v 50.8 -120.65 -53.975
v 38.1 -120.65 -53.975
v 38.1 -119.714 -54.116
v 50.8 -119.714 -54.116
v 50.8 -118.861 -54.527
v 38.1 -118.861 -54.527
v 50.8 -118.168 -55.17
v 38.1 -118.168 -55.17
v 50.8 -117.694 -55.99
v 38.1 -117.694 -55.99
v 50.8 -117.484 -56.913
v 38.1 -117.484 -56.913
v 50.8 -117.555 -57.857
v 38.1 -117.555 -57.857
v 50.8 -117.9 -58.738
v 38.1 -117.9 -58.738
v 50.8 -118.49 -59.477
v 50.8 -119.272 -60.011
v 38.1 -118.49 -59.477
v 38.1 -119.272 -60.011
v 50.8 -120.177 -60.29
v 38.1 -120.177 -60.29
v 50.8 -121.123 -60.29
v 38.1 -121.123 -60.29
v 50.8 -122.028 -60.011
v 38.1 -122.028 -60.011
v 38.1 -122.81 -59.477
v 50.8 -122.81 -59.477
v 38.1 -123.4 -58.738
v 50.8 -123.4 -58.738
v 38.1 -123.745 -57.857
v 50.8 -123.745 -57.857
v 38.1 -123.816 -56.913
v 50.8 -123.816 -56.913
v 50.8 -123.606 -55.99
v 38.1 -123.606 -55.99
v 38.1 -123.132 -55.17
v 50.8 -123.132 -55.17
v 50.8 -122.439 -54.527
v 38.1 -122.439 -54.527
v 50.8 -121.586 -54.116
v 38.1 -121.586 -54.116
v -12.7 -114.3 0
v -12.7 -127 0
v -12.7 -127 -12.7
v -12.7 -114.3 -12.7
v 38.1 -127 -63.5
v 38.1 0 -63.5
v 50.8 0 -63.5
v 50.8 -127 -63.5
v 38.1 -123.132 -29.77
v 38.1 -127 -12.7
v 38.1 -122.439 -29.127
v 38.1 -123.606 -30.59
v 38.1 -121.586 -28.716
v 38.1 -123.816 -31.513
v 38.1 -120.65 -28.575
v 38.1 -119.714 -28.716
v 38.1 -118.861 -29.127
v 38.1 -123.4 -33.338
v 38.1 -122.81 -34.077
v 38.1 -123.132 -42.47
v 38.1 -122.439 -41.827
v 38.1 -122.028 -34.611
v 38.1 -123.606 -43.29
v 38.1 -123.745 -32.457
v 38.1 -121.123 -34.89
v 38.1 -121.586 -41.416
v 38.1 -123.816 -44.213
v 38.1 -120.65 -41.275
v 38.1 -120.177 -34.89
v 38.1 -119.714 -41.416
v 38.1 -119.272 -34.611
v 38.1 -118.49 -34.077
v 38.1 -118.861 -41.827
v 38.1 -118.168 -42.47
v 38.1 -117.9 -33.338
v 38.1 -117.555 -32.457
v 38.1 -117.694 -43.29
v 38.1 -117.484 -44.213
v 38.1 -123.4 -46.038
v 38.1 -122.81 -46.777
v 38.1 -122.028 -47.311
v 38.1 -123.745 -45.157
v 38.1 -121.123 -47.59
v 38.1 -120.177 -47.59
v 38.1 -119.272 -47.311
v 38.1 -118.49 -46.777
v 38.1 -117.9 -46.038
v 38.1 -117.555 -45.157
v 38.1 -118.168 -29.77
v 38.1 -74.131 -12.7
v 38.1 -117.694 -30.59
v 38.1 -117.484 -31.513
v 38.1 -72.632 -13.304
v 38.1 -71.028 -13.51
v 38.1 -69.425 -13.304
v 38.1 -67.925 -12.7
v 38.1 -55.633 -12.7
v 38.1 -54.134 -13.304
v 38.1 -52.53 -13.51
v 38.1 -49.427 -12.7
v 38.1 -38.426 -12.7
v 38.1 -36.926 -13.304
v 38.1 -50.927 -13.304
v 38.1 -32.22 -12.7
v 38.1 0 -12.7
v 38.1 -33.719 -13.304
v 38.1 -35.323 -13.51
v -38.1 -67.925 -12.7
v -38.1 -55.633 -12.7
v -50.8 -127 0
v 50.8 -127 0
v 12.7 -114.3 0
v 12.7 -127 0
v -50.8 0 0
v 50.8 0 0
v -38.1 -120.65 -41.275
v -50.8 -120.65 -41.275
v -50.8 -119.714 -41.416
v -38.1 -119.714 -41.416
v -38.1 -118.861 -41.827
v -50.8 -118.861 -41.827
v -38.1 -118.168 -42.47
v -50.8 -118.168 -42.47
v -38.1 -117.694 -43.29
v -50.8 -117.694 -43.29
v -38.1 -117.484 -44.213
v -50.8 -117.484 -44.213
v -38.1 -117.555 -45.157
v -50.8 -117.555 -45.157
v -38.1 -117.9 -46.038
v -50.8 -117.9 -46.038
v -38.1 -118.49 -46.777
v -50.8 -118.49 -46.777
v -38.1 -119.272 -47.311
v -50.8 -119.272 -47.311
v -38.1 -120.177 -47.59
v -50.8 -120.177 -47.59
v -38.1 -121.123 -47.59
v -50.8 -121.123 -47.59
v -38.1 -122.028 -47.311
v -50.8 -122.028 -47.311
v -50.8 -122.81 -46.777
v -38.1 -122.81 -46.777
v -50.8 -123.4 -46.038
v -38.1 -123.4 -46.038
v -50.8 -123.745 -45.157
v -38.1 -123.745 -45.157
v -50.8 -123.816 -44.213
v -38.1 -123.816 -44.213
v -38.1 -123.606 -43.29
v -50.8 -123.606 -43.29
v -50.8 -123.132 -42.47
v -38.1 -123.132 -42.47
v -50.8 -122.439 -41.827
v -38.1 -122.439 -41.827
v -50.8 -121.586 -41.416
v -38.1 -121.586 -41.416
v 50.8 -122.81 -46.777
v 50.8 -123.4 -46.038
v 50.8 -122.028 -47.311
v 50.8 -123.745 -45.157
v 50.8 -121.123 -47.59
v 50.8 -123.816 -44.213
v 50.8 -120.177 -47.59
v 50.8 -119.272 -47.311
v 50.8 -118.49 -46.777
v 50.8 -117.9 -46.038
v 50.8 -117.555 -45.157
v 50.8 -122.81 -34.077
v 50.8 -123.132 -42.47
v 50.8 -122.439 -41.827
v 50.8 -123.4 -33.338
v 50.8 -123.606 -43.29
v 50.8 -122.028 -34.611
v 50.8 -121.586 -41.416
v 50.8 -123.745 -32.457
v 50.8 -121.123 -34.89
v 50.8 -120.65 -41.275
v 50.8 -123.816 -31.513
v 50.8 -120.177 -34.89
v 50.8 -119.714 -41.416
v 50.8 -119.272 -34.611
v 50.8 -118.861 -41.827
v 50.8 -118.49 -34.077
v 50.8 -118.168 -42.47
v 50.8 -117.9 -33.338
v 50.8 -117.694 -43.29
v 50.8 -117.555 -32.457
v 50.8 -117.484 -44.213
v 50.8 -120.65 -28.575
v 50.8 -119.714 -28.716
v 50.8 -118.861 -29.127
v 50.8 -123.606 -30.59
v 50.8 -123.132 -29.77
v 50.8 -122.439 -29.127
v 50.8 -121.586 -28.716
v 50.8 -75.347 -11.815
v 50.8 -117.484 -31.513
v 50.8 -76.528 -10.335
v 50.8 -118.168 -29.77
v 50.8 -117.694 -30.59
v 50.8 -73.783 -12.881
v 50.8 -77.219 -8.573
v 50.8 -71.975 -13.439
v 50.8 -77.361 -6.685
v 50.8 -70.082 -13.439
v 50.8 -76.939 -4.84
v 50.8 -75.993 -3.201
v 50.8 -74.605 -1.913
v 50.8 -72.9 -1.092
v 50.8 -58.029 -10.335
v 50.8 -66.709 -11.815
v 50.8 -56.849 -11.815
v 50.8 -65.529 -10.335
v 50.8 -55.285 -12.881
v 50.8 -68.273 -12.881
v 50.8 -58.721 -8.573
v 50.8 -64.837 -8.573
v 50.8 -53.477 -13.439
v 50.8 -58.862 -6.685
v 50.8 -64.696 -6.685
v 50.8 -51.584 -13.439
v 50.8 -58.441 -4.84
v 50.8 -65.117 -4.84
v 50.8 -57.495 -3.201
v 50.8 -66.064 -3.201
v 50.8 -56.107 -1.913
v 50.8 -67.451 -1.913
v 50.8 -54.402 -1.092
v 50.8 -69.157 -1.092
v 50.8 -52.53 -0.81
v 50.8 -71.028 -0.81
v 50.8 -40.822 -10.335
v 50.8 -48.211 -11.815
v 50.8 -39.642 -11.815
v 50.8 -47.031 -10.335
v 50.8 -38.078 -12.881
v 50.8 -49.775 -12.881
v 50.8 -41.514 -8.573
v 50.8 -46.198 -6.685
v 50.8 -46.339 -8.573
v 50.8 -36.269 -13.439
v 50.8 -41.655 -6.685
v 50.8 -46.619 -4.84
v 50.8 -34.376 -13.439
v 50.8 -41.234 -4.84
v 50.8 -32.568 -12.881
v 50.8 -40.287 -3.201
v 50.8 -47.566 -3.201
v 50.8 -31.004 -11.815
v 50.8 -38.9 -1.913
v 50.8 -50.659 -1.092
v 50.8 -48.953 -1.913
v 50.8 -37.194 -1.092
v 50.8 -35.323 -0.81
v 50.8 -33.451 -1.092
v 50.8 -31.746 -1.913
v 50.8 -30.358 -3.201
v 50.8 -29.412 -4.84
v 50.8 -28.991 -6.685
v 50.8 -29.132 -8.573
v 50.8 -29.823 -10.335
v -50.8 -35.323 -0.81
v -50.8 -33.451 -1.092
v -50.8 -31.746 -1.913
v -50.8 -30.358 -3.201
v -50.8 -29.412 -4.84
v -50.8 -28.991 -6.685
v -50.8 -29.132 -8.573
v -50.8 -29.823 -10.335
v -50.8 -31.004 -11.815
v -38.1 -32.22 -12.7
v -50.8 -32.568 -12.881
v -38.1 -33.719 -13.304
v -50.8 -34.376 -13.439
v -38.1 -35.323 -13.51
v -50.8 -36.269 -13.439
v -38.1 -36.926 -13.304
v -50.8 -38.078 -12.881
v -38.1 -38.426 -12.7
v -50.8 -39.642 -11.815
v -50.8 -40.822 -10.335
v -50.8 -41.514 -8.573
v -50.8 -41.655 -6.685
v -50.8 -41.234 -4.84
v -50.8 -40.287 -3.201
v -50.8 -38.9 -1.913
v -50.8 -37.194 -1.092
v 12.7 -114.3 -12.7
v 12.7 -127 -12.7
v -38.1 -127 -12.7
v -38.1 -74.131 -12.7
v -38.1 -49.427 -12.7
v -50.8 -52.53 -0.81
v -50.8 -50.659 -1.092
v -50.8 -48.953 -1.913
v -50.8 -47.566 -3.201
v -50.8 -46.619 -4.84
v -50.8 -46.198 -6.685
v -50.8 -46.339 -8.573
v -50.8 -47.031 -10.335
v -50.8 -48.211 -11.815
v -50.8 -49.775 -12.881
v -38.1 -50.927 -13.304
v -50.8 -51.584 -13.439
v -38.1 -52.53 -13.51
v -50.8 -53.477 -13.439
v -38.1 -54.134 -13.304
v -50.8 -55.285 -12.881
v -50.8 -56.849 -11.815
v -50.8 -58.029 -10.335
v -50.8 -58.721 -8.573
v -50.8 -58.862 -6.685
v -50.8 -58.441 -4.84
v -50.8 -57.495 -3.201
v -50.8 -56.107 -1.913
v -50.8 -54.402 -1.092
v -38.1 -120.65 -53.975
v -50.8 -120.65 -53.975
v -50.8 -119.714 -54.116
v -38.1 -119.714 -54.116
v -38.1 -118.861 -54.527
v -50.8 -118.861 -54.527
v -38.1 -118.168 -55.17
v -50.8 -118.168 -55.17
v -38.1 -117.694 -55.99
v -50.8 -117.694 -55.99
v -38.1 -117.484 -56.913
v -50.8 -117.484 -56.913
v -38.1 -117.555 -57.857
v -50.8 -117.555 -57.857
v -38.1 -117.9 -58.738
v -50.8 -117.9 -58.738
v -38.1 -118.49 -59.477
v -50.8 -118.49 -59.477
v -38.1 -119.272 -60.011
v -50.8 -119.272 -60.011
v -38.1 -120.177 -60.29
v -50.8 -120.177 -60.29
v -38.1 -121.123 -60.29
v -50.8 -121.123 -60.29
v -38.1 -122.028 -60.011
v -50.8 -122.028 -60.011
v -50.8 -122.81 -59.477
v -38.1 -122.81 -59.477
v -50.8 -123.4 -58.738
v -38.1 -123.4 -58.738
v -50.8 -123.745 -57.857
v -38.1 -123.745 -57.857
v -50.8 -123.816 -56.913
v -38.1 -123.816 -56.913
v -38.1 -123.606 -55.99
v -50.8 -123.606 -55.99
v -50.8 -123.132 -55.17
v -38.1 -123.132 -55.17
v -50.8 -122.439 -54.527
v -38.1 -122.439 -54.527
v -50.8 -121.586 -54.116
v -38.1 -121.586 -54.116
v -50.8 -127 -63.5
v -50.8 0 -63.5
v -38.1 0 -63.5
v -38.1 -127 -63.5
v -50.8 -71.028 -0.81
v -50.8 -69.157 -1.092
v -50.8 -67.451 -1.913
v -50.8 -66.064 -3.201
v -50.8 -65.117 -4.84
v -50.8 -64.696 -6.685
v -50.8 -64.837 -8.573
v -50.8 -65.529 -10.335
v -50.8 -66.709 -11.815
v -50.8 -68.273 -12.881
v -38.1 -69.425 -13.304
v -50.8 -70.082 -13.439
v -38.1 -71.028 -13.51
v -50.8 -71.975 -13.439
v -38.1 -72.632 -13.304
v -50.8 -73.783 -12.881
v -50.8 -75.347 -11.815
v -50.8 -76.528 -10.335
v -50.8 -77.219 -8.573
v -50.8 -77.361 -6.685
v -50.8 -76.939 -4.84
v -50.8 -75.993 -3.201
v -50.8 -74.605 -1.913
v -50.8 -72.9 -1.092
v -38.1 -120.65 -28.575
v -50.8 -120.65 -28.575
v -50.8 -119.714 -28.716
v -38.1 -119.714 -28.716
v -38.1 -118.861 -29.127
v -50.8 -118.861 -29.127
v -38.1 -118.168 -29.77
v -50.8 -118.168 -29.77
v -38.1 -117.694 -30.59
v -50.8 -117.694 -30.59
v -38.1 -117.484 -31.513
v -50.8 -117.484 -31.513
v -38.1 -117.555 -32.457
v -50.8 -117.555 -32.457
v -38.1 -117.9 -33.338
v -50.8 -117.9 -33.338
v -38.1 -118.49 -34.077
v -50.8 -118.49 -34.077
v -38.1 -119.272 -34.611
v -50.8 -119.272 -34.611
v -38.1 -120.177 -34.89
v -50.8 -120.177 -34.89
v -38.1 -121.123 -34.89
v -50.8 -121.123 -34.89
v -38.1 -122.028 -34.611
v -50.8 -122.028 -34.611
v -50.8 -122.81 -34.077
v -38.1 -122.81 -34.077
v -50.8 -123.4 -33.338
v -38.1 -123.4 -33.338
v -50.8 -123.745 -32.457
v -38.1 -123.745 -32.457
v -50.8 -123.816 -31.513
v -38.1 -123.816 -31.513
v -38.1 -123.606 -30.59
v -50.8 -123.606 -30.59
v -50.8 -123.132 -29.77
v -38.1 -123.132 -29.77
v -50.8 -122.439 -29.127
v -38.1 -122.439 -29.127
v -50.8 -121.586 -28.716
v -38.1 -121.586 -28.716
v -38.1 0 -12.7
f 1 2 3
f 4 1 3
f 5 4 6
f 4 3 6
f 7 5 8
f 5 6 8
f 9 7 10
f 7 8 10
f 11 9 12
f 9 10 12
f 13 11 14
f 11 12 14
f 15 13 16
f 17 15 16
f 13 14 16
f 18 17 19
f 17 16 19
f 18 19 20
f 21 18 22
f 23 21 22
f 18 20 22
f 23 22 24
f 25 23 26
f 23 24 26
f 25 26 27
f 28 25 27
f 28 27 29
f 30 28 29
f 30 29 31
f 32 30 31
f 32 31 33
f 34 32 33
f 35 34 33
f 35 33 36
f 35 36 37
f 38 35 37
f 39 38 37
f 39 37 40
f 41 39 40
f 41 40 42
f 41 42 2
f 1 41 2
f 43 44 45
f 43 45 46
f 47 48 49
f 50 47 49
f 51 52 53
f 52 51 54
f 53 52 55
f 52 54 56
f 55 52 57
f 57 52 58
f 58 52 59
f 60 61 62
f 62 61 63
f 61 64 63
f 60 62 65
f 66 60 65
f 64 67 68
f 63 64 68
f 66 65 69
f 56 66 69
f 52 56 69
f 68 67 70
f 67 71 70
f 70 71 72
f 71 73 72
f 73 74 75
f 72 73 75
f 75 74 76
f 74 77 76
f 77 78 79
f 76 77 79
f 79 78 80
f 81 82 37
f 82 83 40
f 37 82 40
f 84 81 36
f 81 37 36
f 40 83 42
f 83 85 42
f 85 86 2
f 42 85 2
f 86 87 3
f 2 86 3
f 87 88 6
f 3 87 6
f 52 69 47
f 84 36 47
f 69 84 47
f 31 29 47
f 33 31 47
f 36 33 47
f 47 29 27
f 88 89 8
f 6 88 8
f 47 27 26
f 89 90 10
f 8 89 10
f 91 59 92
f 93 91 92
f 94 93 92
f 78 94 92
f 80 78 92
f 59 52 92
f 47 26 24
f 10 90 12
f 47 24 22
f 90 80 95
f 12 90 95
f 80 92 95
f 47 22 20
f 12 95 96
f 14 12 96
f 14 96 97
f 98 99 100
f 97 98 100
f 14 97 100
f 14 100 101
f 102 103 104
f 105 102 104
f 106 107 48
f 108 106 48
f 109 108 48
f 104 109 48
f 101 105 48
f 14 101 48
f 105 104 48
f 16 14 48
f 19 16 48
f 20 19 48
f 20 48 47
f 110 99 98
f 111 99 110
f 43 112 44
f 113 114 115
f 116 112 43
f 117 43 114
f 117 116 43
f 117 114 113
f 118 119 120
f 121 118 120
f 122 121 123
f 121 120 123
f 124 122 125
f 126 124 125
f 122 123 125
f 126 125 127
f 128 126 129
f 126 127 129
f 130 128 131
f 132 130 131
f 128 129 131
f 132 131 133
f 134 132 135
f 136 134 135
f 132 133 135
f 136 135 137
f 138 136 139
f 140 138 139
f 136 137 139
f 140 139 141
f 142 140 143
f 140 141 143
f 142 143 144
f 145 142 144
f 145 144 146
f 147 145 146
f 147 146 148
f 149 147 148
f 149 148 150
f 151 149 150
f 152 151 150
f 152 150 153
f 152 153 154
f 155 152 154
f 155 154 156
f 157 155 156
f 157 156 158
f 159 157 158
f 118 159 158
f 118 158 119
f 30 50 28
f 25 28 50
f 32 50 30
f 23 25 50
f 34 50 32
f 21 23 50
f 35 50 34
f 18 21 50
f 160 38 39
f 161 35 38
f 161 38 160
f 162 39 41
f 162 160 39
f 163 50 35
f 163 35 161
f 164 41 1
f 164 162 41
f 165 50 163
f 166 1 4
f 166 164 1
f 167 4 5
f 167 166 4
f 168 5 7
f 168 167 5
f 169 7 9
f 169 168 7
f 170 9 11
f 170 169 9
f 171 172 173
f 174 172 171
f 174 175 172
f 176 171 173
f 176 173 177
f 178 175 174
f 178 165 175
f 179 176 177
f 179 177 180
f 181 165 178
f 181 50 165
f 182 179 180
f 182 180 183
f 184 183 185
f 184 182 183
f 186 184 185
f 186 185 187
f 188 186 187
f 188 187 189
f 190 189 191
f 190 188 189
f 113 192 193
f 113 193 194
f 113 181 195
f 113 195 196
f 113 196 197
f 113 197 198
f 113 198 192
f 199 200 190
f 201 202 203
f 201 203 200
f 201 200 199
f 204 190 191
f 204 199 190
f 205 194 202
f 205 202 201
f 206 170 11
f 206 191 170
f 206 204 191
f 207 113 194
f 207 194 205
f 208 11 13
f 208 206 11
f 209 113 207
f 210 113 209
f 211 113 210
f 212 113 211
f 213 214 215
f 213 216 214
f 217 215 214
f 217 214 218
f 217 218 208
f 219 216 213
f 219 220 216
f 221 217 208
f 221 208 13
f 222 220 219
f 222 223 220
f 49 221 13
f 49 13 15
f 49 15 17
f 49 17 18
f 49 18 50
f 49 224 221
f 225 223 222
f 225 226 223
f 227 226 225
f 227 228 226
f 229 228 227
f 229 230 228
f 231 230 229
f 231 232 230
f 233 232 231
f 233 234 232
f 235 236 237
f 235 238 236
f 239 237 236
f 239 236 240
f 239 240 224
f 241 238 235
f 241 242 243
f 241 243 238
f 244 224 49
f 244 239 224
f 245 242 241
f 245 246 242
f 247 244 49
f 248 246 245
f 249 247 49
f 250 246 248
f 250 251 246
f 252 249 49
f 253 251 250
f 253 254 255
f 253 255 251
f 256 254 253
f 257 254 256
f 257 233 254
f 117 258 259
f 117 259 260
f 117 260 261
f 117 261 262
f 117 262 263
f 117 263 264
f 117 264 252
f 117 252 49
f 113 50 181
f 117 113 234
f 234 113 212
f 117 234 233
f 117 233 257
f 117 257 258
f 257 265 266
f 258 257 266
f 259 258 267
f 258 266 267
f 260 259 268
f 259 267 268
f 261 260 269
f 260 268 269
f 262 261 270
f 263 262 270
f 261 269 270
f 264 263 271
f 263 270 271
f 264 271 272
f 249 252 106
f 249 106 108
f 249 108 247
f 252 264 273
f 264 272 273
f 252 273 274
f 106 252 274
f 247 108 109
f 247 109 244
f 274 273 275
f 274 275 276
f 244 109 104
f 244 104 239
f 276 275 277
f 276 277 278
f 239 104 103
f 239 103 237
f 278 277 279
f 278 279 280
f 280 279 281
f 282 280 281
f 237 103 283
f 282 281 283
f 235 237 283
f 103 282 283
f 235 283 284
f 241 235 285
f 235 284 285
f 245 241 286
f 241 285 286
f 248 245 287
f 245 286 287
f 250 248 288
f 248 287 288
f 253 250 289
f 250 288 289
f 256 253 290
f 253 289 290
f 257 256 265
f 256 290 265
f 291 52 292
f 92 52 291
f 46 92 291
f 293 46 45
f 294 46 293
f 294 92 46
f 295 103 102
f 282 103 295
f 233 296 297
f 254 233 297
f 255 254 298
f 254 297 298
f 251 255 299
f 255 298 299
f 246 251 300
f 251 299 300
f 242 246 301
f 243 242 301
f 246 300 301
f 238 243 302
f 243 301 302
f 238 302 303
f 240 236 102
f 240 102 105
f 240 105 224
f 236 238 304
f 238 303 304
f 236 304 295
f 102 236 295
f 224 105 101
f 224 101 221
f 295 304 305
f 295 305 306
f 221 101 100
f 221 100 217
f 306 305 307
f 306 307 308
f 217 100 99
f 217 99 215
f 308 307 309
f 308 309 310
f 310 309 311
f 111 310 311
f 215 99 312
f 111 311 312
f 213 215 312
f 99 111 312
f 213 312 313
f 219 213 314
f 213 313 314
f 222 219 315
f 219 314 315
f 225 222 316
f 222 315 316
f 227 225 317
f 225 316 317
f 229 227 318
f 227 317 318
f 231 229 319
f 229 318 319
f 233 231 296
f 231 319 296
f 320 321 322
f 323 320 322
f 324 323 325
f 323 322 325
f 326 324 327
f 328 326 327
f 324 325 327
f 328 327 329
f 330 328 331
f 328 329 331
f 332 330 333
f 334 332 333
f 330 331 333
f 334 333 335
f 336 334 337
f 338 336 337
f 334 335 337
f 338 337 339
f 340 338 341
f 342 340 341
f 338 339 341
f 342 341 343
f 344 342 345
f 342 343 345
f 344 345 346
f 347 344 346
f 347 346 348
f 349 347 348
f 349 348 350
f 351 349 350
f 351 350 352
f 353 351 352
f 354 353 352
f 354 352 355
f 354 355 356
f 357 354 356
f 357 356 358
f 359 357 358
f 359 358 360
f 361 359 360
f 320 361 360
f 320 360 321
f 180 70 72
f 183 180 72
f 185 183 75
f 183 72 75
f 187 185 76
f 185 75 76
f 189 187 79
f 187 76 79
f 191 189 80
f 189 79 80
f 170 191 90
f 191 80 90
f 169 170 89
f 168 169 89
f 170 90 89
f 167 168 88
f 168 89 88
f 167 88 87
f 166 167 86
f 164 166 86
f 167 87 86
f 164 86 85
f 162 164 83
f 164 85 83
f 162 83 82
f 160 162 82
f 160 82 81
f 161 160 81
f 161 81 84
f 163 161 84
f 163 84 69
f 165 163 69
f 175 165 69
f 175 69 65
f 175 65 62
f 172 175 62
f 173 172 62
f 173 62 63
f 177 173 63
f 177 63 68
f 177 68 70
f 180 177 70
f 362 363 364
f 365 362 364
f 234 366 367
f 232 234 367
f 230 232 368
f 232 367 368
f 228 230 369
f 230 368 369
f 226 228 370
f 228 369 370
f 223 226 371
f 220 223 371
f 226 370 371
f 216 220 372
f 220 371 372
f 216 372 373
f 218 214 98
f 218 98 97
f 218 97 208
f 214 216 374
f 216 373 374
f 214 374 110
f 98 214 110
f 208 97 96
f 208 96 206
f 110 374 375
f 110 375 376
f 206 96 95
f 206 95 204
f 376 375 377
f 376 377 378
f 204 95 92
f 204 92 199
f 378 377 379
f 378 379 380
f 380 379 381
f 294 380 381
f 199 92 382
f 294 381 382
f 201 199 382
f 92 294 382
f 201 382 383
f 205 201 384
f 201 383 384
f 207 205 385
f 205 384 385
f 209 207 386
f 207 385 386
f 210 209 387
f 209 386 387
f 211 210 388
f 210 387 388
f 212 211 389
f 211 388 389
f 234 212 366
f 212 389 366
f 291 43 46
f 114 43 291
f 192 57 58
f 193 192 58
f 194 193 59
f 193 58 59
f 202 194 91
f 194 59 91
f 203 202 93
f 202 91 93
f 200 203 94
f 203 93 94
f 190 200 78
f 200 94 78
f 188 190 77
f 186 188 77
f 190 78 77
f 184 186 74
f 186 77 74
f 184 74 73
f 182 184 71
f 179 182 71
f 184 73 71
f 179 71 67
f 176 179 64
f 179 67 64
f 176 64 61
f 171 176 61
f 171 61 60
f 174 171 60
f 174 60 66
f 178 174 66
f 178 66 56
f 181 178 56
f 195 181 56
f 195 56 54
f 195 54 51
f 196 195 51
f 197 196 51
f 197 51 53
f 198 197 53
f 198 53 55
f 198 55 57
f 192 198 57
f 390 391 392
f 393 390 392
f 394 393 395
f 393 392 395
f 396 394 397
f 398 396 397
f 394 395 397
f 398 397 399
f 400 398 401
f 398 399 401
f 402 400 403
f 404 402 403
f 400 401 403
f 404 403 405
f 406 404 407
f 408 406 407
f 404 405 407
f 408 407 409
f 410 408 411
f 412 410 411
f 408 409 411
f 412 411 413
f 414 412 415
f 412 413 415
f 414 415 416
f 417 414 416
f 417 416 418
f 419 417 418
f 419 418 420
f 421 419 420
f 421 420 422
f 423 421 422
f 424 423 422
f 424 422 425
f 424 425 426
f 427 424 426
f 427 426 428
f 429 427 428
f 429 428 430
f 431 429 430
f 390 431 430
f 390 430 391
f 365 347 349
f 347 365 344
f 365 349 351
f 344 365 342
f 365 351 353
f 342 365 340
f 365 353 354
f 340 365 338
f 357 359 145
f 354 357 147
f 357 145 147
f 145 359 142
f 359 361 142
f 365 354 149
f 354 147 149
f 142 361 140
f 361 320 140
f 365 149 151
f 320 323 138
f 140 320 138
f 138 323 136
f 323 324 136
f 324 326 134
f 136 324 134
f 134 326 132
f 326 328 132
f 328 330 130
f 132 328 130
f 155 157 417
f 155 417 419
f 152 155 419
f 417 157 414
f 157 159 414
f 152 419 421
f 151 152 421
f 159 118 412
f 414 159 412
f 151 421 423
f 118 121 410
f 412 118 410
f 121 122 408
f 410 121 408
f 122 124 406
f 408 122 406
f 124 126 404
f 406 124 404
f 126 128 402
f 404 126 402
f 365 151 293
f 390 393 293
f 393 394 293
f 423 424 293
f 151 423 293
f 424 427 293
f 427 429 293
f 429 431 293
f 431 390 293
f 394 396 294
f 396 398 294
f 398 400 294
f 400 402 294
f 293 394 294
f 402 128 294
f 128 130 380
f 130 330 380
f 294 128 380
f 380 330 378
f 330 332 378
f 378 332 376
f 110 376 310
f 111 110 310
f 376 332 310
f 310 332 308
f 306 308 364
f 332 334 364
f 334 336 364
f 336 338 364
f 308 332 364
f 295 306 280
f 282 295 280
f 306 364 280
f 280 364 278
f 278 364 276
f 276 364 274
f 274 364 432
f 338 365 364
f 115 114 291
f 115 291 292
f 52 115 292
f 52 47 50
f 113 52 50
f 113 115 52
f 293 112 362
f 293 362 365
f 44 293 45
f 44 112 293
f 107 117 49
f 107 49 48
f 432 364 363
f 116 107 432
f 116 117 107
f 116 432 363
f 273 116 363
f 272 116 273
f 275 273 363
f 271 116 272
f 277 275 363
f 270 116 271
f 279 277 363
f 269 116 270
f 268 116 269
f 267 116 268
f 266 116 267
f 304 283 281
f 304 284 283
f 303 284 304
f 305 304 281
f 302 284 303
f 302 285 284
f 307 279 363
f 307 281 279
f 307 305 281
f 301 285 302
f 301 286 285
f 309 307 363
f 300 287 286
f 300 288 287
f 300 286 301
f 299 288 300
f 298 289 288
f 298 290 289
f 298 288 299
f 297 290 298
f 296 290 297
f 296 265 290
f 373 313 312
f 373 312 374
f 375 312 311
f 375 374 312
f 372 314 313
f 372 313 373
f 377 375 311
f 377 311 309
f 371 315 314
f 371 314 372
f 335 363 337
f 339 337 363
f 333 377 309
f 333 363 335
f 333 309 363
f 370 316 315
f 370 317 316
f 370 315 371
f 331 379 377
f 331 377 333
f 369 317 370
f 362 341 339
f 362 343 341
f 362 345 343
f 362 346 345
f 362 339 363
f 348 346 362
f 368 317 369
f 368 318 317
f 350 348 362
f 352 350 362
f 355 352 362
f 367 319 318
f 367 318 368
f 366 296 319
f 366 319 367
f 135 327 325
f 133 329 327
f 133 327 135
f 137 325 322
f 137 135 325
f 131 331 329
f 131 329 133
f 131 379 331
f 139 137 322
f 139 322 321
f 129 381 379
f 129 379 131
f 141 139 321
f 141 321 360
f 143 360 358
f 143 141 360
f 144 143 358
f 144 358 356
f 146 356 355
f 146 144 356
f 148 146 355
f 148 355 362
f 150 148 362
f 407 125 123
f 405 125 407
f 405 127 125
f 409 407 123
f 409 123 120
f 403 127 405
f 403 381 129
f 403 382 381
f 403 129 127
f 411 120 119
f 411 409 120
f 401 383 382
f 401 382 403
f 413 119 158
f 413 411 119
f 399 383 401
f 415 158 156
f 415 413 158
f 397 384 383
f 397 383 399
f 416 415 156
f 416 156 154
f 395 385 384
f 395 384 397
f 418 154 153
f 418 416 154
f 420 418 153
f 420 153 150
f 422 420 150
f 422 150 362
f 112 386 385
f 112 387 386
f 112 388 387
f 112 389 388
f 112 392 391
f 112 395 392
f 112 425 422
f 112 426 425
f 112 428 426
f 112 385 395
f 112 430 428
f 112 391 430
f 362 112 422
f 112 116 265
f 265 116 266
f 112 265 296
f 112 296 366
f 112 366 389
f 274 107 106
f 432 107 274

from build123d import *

# Parameters (mm, degrees)
BOSS_EXTRUDE1_DEPTH = 63.5
CUT_EXTRUDE1_DEPTH  = 151.804144505
SKETCH3_R           = 6.35
CUT_EXTRUDE2_DEPTH  = 175.596133978
SKETCH4_R           = 3.175
CUT_EXTRUDE3_DEPTH  = 175.596133978


with BuildPart() as part:
    # Sketch1 → Boss-Extrude1 (new body)
    with BuildSketch(Plane.XY):
        Polygon((12.7, -127), (50.8, -127), (50.8, 0), (-50.8, 0), (-50.8, -127), (-12.7, -127), (-12.7, -114.3), (12.7, -114.3), align=None)
    extrude(amount=-BOSS_EXTRUDE1_DEPTH)

    # Sketch2 → Cut-Extrude1 (cut, through all)
    with BuildSketch(Plane(origin=(0, 0, 0), x_dir=(1, 0, 0), z_dir=(0, 1, 0))):
        Polygon((-38.1, 50.8), (-38.1, 63.5), (38.1, 63.5), (38.1, 50.8), (38.1, 12.7), (-38.1, 12.7), align=None)
    extrude(amount=-CUT_EXTRUDE1_DEPTH, mode=Mode.SUBTRACT)

    # Sketch3 → Cut-Extrude2 (cut, through all)
    with BuildSketch(Plane.ZY.offset(50.8)):
        with Locations((-7.159845265, -35.322751873)):
            Circle(SKETCH3_R)
        with Locations((-7.159845265, -52.530231645)):
            Circle(SKETCH3_R)
        with Locations((-7.159845265, -71.0282724)):
            Circle(SKETCH3_R)
    extrude(amount=-CUT_EXTRUDE2_DEPTH, mode=Mode.SUBTRACT)

    # Sketch4 → Cut-Extrude3 (cut, through all)
    with BuildSketch(Plane.ZY.offset(50.8)):
        with Locations((-57.15, -120.65)):
            Circle(SKETCH4_R)
        with Locations((-44.45, -120.65)):
            Circle(SKETCH4_R)
        with Locations((-31.75, -120.65)):
            Circle(SKETCH4_R)
    extrude(amount=-CUT_EXTRUDE3_DEPTH, mode=Mode.SUBTRACT)


solid = part.part
